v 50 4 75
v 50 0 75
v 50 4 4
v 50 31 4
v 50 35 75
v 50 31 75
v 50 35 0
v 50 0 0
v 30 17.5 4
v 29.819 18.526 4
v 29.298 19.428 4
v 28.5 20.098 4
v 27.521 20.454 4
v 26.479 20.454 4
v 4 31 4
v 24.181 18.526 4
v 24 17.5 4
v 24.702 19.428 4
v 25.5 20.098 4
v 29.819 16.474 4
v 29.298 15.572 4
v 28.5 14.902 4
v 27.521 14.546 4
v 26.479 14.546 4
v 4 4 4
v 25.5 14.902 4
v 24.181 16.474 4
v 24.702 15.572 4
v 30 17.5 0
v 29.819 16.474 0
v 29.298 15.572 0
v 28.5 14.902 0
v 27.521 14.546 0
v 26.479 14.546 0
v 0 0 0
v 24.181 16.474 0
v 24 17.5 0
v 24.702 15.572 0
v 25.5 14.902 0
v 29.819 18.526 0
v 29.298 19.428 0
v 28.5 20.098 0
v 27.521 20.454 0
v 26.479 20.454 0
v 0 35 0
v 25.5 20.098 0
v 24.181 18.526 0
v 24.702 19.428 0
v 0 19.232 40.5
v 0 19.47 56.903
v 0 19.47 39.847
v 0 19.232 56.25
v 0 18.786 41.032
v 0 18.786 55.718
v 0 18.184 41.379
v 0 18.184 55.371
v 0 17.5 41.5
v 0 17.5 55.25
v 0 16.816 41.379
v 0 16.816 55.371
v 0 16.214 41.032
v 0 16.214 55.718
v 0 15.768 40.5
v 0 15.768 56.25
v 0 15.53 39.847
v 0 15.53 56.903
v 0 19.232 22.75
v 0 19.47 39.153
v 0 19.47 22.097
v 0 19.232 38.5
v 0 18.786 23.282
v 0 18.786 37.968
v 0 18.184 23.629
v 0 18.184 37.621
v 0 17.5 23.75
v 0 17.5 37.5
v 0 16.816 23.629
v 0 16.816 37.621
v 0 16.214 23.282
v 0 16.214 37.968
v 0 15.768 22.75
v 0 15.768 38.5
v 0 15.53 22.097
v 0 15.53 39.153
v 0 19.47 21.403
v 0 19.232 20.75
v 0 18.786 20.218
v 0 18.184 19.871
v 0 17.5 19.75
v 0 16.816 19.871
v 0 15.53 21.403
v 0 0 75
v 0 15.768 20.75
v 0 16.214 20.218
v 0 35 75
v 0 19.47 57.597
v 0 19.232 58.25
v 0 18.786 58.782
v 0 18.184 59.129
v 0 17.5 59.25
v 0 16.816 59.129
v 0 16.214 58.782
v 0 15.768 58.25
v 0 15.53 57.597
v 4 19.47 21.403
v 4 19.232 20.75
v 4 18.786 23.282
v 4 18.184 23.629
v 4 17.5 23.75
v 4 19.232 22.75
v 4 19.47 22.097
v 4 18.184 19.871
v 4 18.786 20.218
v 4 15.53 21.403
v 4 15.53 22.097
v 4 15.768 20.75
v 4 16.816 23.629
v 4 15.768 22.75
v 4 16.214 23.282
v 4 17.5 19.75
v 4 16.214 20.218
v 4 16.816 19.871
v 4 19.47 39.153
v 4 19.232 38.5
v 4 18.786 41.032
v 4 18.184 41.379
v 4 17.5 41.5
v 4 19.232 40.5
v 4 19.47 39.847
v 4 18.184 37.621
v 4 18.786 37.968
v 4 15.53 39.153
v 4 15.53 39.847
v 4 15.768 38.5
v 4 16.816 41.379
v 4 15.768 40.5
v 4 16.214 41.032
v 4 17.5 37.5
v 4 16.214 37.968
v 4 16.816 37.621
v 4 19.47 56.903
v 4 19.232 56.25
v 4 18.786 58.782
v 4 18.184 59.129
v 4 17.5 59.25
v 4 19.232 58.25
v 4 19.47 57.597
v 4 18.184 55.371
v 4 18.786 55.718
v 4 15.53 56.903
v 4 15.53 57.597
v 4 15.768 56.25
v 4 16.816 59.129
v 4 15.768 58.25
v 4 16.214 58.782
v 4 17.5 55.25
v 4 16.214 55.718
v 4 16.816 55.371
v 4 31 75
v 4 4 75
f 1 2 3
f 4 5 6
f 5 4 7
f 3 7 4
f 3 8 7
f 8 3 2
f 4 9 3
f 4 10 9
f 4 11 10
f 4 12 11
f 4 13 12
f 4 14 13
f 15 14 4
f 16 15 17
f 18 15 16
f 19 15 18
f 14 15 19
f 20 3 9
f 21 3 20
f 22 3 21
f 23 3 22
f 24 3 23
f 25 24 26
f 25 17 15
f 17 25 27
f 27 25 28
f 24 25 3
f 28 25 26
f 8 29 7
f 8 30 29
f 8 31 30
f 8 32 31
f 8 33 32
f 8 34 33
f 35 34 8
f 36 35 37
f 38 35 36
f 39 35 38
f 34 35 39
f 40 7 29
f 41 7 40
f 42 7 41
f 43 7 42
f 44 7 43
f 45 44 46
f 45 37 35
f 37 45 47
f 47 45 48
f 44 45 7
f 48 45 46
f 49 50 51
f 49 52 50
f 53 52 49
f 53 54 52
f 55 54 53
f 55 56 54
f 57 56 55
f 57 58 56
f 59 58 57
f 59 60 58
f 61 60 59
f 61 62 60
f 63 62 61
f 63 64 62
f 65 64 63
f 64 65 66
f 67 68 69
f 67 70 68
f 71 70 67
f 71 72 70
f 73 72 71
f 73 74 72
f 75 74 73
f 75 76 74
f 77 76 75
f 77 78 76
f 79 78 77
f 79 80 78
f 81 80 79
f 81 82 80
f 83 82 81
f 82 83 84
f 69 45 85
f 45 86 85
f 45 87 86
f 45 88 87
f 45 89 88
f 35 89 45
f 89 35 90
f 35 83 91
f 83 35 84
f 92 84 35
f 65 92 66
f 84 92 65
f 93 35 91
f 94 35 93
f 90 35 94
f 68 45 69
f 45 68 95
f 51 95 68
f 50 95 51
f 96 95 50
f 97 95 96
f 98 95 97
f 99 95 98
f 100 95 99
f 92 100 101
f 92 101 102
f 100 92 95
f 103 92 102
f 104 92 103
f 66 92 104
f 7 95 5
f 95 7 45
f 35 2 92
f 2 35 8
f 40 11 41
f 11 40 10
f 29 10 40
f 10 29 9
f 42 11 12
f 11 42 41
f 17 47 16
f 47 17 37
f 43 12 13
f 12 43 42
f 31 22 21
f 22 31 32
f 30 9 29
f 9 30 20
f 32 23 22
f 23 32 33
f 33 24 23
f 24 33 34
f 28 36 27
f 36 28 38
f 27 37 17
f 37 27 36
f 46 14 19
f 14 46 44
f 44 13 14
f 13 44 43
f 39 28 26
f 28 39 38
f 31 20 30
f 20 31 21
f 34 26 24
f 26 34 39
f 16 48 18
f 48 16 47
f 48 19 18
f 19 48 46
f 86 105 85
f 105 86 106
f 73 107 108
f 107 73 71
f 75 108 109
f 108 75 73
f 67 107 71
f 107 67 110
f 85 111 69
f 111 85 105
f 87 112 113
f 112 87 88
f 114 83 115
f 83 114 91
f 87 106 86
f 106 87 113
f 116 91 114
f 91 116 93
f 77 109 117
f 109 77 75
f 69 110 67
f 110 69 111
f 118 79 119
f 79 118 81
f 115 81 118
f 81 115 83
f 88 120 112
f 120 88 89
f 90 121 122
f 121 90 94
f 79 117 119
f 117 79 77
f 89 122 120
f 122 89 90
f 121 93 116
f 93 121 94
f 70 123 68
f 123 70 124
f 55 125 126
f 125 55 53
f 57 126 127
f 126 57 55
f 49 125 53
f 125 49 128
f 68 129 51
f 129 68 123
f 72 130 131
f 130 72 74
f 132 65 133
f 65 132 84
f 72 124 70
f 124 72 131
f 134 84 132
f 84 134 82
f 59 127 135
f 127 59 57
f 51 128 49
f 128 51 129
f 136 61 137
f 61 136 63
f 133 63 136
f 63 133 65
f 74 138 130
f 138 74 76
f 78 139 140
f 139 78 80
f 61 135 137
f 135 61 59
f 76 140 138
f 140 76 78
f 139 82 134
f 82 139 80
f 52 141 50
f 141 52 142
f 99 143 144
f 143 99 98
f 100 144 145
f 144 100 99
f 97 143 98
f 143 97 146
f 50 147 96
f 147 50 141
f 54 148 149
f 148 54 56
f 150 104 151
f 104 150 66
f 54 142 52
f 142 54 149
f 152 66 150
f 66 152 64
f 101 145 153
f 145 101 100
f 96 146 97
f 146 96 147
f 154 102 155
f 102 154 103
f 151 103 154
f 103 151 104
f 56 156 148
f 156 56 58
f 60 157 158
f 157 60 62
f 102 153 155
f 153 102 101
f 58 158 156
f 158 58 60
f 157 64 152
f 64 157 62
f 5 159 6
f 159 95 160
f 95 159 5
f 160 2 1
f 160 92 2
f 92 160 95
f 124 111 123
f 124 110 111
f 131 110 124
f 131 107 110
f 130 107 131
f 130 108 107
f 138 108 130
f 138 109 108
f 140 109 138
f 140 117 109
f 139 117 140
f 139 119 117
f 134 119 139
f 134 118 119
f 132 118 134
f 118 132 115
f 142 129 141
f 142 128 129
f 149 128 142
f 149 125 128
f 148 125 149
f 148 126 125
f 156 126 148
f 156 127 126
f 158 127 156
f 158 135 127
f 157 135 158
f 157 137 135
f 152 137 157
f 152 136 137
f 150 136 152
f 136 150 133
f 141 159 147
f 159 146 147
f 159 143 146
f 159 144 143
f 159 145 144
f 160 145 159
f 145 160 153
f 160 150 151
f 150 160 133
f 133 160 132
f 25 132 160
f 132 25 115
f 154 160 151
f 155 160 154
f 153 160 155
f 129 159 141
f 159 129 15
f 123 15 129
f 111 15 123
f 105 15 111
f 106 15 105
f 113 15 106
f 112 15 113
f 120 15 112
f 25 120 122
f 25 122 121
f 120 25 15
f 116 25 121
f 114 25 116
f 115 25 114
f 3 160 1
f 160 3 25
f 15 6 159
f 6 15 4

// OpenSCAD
/*
    module shelf_bracket
    
    parameters:
    - side_a    is a vector [length, hole diameter, number of holes]
    - side_b    is a vector [length, hole diameter, number of holes]
    - width     refers to the width of the bracket
    - thickness refers to the material thickness of the bracket
*/

module shelf_bracket( side_a = [50,6,1], side_b = [75,4,3], width = 35, thickness = 4 ) {
    
    module xhole_plate( size, h_dm, h_num, margin ) {
        
        difference() {
        
            cube(size);
            
            h_distance = (size.x - margin) / (h_num + 1);
            
            for (x = [1:h_num])
                translate([
                    margin + x * h_distance,
                    size.y/2,
                    -1])
                cylinder( d = h_dm, h = size.z + 2, $fn=18);
            }
        }
        
        union() {
            
            // side A
            xhole_plate(
                [side_a[0], width, thickness],
                side_a[1],
                side_a[2],
                thickness
            );
            
            // side B
            translate([thickness,0,0])
            rotate([0,-90,0])
            xhole_plate(
                [side_b[0], width, thickness],
                side_b[1],
                side_b[2],
                thickness
            );
            
            // stringer
            cube( [side_a[0], thickness, side_b[0]]);
            
            translate( [0, width - thickness, 0] )
                cube( [side_a[0], thickness, side_b[0]]);
        }
    }

//shelf_bracket(
//  side_a    = [50, 6, 1],
//  side_b    = [75, 4, 3],
//  width     = 35,
//  thickness = 4
//);
    
shelf_bracket();
